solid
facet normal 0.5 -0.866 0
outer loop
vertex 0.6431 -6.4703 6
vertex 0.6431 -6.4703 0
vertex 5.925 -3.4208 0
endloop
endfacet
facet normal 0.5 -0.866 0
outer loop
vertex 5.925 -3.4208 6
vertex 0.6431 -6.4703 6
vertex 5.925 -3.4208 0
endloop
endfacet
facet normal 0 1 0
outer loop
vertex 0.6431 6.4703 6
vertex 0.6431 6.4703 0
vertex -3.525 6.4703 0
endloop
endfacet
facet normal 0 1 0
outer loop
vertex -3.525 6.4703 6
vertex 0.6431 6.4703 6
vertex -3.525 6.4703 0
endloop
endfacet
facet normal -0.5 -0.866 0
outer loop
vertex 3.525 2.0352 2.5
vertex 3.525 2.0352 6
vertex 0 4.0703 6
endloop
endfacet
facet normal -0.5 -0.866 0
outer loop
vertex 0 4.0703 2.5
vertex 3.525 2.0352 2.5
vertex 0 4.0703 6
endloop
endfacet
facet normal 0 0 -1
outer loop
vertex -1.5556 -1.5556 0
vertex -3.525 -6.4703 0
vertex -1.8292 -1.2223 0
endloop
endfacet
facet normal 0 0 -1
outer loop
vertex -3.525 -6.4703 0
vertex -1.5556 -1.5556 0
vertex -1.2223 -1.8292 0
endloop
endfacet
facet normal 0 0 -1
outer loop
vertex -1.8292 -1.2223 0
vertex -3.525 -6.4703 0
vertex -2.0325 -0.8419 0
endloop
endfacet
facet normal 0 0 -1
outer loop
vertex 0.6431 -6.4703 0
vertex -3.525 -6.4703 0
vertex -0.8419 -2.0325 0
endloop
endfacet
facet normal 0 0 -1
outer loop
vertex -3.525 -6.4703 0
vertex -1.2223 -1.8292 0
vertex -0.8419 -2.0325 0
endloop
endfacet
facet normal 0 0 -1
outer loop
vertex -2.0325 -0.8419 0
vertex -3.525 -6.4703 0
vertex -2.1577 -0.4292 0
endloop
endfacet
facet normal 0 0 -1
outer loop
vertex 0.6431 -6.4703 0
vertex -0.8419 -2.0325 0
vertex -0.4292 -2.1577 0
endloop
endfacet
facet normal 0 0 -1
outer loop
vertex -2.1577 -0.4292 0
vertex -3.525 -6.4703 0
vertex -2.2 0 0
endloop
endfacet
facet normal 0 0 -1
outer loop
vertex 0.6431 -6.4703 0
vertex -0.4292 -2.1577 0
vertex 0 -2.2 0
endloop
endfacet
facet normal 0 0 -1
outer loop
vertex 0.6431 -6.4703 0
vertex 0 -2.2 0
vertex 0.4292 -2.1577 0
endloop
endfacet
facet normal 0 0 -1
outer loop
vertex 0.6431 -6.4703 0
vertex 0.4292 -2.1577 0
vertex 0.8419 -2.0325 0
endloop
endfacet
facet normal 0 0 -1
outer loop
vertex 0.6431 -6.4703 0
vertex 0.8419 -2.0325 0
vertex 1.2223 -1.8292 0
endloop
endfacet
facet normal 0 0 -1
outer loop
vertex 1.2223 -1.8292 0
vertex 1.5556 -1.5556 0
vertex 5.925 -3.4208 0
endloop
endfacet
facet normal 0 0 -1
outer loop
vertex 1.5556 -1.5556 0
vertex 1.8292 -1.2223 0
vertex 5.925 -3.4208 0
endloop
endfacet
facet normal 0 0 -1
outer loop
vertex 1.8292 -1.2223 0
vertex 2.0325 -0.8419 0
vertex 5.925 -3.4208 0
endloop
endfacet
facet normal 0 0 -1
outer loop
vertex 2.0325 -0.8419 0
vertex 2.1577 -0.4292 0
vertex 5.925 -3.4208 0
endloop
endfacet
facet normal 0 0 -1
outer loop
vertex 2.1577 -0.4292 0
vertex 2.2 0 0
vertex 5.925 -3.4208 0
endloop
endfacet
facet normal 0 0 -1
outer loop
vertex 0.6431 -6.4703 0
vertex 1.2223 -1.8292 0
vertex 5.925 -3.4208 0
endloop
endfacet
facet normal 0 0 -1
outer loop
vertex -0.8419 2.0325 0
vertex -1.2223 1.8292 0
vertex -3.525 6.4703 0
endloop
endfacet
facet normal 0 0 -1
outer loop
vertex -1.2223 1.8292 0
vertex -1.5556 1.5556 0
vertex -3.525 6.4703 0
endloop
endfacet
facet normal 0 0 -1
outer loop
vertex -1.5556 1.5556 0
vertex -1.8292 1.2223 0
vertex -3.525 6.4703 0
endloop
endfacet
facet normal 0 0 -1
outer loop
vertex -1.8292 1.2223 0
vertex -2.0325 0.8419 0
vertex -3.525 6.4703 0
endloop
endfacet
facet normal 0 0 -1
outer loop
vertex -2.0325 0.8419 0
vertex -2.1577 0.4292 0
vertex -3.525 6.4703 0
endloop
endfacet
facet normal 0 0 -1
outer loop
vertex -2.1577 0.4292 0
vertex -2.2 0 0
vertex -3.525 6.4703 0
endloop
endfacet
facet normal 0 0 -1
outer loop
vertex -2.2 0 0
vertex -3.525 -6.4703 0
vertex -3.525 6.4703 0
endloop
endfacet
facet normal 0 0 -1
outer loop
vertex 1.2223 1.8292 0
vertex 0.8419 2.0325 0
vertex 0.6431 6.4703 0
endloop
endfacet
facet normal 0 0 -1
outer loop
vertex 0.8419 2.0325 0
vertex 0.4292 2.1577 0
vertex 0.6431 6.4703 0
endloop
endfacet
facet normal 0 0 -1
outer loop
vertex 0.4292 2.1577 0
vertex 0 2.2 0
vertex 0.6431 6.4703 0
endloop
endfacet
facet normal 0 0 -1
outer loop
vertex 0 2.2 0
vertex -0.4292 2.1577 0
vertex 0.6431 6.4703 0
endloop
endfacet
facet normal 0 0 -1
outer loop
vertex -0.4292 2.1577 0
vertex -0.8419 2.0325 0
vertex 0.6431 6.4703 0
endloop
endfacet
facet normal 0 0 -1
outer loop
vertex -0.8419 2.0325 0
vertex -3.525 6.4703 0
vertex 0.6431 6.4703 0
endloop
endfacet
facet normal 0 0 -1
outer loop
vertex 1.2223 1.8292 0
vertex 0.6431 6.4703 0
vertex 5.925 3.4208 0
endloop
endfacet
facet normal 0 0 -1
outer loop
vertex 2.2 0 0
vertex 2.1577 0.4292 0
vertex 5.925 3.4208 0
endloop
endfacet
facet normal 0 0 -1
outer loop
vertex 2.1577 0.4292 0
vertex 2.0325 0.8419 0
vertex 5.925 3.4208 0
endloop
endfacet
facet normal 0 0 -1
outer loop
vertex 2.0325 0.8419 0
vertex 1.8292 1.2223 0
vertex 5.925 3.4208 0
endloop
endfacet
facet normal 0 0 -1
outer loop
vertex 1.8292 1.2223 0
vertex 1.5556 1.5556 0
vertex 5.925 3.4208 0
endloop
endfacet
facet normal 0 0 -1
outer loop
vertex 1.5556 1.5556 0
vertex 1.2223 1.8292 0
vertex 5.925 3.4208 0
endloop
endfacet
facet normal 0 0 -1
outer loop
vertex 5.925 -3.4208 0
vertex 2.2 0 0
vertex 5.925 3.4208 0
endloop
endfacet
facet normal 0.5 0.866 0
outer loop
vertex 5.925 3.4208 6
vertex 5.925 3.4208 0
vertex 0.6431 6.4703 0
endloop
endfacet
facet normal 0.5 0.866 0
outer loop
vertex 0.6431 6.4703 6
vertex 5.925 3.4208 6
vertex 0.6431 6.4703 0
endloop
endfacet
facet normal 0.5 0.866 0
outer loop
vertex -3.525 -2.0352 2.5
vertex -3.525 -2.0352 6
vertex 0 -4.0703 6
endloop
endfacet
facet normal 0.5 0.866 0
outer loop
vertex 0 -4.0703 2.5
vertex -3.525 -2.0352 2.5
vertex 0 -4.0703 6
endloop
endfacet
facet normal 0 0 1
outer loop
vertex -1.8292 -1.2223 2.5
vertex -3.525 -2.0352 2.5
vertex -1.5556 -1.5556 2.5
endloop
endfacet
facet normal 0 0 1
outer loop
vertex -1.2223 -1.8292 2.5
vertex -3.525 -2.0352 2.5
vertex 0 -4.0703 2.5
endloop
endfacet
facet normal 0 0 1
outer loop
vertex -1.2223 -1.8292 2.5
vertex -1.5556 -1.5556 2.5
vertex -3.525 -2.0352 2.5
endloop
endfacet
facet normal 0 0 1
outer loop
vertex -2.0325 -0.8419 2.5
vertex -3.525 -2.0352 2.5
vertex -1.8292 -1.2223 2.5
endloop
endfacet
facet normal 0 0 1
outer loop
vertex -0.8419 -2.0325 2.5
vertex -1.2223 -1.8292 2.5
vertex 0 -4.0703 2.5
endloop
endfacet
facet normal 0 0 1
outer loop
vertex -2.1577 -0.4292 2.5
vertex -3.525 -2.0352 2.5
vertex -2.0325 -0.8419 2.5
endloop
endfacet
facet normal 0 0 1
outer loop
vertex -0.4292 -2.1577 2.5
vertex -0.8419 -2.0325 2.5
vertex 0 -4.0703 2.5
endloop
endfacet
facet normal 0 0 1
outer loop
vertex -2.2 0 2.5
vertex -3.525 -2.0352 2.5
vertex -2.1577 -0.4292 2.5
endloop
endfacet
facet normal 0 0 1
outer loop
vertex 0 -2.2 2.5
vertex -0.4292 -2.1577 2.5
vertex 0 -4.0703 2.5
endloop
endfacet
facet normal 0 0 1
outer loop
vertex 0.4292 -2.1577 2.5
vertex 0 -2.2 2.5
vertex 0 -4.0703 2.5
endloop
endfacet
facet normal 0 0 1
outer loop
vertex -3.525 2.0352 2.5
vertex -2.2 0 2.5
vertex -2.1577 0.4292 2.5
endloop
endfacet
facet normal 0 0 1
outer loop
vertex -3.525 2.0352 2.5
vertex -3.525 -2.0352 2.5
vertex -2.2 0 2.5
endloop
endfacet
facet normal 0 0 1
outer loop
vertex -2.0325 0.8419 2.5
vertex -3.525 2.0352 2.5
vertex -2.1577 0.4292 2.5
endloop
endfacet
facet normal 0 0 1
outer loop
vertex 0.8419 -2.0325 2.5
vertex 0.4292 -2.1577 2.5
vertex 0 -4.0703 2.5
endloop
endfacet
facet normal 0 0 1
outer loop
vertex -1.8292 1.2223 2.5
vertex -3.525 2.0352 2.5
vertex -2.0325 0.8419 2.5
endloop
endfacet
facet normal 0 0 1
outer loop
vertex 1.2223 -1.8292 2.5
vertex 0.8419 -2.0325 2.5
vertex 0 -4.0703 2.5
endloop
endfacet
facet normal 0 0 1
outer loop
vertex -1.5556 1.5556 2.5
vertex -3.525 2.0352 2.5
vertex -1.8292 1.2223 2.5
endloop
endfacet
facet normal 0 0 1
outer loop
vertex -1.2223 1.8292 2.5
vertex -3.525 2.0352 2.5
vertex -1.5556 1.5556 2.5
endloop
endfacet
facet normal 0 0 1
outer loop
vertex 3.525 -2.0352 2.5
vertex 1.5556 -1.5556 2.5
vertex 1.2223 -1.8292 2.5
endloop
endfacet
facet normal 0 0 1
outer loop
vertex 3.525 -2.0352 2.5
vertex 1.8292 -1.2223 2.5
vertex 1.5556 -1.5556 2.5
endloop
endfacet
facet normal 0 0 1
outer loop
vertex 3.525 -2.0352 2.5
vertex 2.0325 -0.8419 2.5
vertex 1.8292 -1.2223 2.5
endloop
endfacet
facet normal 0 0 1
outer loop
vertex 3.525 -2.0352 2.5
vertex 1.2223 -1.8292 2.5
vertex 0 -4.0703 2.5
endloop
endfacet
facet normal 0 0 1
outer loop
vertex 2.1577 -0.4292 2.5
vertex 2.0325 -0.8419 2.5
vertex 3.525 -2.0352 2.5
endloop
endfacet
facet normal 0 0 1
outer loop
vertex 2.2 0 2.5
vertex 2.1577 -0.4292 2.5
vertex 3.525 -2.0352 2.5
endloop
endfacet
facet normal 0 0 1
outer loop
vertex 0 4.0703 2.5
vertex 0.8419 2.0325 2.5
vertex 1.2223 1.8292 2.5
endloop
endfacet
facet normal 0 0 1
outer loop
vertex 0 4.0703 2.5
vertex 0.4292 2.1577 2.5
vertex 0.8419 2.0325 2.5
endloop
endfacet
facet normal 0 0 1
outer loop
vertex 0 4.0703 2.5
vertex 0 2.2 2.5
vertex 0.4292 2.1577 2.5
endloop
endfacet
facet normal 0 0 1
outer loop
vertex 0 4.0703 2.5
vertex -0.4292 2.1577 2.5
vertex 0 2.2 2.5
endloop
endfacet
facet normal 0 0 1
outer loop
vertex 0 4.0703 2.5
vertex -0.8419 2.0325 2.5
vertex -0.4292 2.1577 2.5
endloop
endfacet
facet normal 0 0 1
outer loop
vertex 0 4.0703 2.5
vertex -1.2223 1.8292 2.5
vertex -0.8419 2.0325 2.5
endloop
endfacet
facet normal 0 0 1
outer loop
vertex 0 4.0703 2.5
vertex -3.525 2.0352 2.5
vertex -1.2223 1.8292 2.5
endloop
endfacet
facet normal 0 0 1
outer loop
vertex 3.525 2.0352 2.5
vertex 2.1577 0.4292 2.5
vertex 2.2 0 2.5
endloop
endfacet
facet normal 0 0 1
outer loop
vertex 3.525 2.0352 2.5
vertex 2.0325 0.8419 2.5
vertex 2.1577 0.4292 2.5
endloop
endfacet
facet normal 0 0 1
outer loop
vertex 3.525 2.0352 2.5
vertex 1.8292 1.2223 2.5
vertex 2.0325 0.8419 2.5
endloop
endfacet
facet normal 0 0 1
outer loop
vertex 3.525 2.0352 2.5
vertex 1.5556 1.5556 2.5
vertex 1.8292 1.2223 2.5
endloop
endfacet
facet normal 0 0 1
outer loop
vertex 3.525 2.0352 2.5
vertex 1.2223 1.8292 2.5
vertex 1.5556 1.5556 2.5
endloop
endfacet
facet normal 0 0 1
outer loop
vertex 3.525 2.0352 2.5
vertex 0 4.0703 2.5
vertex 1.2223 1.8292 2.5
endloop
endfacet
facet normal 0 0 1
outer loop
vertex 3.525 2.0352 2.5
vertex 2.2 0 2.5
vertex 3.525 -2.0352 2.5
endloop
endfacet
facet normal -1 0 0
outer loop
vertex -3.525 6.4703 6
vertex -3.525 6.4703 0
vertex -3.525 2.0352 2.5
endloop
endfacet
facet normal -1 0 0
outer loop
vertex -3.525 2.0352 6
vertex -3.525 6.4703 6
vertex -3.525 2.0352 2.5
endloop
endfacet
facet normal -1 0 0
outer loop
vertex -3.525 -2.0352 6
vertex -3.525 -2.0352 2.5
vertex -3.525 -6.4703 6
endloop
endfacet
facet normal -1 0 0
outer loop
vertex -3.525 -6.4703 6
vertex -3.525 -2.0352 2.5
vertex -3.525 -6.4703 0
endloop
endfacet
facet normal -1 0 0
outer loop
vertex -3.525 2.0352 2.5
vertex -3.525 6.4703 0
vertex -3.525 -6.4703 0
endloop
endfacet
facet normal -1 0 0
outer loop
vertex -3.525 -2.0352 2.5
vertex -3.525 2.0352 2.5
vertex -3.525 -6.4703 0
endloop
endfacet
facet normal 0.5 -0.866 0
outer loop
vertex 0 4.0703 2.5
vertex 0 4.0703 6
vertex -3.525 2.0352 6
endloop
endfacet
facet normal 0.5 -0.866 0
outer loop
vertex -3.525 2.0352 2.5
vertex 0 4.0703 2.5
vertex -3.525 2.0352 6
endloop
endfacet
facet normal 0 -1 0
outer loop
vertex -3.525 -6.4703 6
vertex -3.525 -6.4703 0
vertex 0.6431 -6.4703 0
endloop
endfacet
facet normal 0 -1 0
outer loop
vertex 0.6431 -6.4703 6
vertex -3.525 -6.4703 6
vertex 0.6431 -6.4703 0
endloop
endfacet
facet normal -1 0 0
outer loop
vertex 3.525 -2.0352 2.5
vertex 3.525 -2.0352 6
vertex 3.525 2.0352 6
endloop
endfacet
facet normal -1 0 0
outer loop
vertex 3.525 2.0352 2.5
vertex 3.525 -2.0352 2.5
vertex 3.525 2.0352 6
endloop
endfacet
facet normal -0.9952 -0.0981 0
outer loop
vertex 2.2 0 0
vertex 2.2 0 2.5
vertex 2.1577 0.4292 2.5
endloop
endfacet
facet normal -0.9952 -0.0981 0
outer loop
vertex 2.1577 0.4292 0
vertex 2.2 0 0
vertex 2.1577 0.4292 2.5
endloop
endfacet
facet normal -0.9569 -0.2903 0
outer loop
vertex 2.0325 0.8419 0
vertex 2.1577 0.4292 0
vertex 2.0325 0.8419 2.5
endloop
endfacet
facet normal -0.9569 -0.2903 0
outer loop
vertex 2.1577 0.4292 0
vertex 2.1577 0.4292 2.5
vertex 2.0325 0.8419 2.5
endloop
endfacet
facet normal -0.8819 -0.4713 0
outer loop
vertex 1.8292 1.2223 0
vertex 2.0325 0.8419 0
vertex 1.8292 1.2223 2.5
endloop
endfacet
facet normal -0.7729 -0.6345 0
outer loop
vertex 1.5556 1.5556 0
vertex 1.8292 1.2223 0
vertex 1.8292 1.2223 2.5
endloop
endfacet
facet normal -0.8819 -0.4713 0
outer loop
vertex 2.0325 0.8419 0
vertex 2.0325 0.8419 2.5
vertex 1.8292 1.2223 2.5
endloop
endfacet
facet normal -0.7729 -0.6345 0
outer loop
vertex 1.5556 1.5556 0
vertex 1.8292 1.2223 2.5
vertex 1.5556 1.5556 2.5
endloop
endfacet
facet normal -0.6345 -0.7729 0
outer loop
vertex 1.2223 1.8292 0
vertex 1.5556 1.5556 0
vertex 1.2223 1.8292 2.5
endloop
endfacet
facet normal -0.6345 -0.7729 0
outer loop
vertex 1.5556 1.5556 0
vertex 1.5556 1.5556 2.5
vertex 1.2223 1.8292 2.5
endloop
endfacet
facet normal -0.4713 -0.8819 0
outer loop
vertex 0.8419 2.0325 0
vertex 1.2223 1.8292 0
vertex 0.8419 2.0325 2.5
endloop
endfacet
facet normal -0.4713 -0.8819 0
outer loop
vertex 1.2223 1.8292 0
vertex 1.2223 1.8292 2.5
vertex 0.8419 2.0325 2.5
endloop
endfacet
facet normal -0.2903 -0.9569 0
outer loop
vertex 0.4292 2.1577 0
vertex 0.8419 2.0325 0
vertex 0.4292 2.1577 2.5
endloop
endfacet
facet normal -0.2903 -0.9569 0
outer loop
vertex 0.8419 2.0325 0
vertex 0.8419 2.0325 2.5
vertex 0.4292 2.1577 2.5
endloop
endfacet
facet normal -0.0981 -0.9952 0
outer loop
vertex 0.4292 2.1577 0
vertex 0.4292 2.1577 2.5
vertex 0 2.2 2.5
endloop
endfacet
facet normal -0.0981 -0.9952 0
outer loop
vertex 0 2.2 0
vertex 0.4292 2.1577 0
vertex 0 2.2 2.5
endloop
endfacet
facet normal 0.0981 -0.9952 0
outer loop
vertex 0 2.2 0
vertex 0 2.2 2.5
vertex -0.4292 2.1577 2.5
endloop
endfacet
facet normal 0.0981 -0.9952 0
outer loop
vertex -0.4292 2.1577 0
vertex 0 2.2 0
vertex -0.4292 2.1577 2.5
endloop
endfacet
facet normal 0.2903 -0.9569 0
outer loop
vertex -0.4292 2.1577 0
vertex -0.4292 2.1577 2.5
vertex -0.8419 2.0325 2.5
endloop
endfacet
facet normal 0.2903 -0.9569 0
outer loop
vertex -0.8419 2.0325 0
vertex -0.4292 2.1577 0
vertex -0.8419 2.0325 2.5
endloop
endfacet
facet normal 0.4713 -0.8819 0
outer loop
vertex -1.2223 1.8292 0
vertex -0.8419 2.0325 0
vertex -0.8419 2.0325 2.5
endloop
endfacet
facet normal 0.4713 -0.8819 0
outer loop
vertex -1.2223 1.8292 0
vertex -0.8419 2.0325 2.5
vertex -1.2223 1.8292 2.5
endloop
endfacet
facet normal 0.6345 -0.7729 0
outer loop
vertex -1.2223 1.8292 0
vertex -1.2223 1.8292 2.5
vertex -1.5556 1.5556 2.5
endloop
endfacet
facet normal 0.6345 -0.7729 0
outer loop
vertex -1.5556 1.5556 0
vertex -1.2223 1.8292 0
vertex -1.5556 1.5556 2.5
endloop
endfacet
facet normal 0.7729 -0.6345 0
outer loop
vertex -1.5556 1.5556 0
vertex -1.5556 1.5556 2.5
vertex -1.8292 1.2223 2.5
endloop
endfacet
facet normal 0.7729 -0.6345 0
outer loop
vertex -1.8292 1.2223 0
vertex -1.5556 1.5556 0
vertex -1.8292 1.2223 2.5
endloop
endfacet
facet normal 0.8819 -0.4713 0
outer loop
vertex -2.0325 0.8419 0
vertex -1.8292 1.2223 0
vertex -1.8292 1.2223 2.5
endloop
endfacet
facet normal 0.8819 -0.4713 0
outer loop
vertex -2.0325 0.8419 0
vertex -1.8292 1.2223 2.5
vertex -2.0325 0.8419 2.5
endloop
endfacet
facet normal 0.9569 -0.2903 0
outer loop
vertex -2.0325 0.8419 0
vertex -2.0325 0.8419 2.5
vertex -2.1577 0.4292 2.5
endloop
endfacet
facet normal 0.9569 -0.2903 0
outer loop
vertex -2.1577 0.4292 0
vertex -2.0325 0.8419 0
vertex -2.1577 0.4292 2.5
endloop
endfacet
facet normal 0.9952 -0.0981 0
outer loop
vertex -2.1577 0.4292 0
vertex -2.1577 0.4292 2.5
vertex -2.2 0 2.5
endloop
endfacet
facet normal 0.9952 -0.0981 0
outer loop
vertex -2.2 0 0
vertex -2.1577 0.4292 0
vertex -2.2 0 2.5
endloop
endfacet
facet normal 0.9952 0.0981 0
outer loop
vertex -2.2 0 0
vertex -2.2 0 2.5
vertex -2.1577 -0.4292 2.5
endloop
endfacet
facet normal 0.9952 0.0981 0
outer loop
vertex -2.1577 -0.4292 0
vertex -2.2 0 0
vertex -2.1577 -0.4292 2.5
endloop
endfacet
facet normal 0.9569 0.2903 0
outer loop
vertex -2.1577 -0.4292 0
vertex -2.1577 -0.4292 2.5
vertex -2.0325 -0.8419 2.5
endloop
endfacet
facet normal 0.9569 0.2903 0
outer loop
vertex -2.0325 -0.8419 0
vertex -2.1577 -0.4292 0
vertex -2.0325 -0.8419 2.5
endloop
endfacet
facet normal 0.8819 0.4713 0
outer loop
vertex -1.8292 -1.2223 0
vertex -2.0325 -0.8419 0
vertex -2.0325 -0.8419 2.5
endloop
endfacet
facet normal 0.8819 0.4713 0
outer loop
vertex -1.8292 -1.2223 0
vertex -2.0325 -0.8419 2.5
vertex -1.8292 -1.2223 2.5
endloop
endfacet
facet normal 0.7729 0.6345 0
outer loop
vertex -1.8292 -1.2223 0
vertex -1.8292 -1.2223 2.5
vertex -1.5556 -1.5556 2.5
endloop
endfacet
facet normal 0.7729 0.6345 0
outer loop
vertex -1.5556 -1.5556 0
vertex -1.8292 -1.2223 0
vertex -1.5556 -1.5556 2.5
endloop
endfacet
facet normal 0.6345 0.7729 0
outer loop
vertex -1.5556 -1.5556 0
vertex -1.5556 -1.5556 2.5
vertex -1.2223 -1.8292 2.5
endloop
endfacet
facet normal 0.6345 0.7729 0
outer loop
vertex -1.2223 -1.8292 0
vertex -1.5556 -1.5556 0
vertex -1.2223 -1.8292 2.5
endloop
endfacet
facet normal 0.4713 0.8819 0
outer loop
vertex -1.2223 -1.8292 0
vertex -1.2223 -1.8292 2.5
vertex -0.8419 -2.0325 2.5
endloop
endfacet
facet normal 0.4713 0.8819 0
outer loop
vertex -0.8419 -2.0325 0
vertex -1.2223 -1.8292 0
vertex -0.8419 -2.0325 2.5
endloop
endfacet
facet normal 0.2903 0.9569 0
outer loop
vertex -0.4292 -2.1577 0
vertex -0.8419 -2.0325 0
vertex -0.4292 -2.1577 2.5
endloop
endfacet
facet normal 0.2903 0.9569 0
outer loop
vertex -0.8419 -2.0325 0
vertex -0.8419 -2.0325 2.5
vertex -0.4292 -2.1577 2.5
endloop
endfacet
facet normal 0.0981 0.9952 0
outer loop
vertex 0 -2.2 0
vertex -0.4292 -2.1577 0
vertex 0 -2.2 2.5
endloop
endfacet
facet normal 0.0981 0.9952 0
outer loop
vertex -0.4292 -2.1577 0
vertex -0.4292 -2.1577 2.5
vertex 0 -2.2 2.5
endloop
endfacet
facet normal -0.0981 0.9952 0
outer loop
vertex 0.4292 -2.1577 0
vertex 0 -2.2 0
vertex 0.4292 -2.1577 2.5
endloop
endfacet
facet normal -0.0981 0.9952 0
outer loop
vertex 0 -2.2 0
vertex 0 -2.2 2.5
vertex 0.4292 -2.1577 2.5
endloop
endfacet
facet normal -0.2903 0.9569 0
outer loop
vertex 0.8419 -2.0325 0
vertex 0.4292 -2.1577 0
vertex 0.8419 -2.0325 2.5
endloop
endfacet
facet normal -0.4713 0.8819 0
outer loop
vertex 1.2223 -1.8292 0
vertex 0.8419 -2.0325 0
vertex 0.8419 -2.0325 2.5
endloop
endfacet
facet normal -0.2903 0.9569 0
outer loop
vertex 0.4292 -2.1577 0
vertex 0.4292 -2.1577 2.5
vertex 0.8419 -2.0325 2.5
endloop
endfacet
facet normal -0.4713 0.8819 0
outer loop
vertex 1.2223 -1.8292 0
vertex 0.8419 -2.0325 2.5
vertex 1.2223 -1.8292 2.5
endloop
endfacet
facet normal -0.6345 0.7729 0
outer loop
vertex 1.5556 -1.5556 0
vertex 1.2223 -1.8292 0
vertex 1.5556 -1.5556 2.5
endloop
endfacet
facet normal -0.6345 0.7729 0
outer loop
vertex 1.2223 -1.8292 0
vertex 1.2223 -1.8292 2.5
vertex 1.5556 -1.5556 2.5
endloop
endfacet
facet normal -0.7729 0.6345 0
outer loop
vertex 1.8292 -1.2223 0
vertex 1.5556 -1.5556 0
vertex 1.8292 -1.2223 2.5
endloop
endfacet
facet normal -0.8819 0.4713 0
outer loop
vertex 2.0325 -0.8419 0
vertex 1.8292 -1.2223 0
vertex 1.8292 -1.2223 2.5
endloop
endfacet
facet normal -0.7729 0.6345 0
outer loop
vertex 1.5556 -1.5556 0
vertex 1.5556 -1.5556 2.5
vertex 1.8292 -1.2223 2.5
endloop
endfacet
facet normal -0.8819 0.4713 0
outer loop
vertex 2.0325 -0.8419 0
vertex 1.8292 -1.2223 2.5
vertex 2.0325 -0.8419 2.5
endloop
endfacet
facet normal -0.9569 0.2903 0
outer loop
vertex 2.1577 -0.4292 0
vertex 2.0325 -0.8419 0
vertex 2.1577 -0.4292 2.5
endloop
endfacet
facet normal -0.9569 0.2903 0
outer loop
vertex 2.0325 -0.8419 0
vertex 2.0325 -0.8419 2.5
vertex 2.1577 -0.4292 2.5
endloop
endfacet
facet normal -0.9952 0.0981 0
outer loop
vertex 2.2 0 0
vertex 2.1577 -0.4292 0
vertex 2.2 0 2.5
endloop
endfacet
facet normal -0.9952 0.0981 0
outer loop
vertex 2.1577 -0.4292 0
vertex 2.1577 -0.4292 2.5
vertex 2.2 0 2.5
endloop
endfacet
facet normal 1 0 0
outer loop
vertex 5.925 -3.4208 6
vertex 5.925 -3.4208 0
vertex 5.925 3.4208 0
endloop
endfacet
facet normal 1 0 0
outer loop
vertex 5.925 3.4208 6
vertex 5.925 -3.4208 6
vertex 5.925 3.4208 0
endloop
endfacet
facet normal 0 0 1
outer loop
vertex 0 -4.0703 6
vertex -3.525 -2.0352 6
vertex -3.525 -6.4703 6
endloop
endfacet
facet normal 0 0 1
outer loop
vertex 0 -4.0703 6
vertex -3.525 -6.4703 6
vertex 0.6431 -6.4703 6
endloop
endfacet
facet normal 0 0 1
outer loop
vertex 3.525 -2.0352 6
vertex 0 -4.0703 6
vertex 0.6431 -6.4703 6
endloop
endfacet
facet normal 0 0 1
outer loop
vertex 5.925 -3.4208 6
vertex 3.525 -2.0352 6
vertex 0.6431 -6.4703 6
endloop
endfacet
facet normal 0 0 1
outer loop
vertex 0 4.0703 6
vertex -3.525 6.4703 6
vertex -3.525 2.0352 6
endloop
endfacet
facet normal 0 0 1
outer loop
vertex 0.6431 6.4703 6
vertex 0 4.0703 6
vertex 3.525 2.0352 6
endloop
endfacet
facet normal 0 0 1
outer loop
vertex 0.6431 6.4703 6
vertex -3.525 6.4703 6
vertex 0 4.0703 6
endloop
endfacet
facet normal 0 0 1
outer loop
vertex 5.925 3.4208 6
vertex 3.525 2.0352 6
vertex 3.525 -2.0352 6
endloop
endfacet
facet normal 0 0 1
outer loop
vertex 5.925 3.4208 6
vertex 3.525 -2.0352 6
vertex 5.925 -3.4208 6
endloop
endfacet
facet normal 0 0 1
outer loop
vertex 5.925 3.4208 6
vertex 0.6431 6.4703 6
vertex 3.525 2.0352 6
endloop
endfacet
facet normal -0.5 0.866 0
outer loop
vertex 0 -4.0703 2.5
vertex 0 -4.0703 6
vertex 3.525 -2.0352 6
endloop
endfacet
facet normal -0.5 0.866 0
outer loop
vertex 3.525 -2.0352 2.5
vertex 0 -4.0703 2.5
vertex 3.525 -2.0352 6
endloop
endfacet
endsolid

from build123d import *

# Parameters (mm, degrees)
PAD_DEPTH       = 6
SKETCH001_R     = 2.2
POCKET_DEPTH    = 6.001
POCKET001_DEPTH = 3.5


with BuildPart() as part:
    # Sketch → Pad (new body)
    with BuildSketch(Plane.XY):
        Polygon((-3.525, 6.470319), (-3.525, -6.470319), (0.643078, -6.470319), (5.925, -3.4208), (5.925, 3.4208), (0.643078, 6.470319), align=None)
    extrude(amount=PAD_DEPTH)

    # Sketch001 → Pocket (cut, through all)
    with BuildSketch(Plane.XY.offset(6)):
        Circle(SKETCH001_R)
    extrude(amount=-POCKET_DEPTH, mode=Mode.SUBTRACT)

    # Sketch002 → Pocket001 (cut)
    with BuildSketch(Plane.XY.offset(6)):
        Polygon((0, -4.070319), (3.525, -2.03516), (3.525, 2.03516), (0, 4.070319), (-3.525, 2.03516), (-3.525, -2.03516), align=None)
    extrude(amount=-POCKET001_DEPTH, mode=Mode.SUBTRACT)


solid = part.part
